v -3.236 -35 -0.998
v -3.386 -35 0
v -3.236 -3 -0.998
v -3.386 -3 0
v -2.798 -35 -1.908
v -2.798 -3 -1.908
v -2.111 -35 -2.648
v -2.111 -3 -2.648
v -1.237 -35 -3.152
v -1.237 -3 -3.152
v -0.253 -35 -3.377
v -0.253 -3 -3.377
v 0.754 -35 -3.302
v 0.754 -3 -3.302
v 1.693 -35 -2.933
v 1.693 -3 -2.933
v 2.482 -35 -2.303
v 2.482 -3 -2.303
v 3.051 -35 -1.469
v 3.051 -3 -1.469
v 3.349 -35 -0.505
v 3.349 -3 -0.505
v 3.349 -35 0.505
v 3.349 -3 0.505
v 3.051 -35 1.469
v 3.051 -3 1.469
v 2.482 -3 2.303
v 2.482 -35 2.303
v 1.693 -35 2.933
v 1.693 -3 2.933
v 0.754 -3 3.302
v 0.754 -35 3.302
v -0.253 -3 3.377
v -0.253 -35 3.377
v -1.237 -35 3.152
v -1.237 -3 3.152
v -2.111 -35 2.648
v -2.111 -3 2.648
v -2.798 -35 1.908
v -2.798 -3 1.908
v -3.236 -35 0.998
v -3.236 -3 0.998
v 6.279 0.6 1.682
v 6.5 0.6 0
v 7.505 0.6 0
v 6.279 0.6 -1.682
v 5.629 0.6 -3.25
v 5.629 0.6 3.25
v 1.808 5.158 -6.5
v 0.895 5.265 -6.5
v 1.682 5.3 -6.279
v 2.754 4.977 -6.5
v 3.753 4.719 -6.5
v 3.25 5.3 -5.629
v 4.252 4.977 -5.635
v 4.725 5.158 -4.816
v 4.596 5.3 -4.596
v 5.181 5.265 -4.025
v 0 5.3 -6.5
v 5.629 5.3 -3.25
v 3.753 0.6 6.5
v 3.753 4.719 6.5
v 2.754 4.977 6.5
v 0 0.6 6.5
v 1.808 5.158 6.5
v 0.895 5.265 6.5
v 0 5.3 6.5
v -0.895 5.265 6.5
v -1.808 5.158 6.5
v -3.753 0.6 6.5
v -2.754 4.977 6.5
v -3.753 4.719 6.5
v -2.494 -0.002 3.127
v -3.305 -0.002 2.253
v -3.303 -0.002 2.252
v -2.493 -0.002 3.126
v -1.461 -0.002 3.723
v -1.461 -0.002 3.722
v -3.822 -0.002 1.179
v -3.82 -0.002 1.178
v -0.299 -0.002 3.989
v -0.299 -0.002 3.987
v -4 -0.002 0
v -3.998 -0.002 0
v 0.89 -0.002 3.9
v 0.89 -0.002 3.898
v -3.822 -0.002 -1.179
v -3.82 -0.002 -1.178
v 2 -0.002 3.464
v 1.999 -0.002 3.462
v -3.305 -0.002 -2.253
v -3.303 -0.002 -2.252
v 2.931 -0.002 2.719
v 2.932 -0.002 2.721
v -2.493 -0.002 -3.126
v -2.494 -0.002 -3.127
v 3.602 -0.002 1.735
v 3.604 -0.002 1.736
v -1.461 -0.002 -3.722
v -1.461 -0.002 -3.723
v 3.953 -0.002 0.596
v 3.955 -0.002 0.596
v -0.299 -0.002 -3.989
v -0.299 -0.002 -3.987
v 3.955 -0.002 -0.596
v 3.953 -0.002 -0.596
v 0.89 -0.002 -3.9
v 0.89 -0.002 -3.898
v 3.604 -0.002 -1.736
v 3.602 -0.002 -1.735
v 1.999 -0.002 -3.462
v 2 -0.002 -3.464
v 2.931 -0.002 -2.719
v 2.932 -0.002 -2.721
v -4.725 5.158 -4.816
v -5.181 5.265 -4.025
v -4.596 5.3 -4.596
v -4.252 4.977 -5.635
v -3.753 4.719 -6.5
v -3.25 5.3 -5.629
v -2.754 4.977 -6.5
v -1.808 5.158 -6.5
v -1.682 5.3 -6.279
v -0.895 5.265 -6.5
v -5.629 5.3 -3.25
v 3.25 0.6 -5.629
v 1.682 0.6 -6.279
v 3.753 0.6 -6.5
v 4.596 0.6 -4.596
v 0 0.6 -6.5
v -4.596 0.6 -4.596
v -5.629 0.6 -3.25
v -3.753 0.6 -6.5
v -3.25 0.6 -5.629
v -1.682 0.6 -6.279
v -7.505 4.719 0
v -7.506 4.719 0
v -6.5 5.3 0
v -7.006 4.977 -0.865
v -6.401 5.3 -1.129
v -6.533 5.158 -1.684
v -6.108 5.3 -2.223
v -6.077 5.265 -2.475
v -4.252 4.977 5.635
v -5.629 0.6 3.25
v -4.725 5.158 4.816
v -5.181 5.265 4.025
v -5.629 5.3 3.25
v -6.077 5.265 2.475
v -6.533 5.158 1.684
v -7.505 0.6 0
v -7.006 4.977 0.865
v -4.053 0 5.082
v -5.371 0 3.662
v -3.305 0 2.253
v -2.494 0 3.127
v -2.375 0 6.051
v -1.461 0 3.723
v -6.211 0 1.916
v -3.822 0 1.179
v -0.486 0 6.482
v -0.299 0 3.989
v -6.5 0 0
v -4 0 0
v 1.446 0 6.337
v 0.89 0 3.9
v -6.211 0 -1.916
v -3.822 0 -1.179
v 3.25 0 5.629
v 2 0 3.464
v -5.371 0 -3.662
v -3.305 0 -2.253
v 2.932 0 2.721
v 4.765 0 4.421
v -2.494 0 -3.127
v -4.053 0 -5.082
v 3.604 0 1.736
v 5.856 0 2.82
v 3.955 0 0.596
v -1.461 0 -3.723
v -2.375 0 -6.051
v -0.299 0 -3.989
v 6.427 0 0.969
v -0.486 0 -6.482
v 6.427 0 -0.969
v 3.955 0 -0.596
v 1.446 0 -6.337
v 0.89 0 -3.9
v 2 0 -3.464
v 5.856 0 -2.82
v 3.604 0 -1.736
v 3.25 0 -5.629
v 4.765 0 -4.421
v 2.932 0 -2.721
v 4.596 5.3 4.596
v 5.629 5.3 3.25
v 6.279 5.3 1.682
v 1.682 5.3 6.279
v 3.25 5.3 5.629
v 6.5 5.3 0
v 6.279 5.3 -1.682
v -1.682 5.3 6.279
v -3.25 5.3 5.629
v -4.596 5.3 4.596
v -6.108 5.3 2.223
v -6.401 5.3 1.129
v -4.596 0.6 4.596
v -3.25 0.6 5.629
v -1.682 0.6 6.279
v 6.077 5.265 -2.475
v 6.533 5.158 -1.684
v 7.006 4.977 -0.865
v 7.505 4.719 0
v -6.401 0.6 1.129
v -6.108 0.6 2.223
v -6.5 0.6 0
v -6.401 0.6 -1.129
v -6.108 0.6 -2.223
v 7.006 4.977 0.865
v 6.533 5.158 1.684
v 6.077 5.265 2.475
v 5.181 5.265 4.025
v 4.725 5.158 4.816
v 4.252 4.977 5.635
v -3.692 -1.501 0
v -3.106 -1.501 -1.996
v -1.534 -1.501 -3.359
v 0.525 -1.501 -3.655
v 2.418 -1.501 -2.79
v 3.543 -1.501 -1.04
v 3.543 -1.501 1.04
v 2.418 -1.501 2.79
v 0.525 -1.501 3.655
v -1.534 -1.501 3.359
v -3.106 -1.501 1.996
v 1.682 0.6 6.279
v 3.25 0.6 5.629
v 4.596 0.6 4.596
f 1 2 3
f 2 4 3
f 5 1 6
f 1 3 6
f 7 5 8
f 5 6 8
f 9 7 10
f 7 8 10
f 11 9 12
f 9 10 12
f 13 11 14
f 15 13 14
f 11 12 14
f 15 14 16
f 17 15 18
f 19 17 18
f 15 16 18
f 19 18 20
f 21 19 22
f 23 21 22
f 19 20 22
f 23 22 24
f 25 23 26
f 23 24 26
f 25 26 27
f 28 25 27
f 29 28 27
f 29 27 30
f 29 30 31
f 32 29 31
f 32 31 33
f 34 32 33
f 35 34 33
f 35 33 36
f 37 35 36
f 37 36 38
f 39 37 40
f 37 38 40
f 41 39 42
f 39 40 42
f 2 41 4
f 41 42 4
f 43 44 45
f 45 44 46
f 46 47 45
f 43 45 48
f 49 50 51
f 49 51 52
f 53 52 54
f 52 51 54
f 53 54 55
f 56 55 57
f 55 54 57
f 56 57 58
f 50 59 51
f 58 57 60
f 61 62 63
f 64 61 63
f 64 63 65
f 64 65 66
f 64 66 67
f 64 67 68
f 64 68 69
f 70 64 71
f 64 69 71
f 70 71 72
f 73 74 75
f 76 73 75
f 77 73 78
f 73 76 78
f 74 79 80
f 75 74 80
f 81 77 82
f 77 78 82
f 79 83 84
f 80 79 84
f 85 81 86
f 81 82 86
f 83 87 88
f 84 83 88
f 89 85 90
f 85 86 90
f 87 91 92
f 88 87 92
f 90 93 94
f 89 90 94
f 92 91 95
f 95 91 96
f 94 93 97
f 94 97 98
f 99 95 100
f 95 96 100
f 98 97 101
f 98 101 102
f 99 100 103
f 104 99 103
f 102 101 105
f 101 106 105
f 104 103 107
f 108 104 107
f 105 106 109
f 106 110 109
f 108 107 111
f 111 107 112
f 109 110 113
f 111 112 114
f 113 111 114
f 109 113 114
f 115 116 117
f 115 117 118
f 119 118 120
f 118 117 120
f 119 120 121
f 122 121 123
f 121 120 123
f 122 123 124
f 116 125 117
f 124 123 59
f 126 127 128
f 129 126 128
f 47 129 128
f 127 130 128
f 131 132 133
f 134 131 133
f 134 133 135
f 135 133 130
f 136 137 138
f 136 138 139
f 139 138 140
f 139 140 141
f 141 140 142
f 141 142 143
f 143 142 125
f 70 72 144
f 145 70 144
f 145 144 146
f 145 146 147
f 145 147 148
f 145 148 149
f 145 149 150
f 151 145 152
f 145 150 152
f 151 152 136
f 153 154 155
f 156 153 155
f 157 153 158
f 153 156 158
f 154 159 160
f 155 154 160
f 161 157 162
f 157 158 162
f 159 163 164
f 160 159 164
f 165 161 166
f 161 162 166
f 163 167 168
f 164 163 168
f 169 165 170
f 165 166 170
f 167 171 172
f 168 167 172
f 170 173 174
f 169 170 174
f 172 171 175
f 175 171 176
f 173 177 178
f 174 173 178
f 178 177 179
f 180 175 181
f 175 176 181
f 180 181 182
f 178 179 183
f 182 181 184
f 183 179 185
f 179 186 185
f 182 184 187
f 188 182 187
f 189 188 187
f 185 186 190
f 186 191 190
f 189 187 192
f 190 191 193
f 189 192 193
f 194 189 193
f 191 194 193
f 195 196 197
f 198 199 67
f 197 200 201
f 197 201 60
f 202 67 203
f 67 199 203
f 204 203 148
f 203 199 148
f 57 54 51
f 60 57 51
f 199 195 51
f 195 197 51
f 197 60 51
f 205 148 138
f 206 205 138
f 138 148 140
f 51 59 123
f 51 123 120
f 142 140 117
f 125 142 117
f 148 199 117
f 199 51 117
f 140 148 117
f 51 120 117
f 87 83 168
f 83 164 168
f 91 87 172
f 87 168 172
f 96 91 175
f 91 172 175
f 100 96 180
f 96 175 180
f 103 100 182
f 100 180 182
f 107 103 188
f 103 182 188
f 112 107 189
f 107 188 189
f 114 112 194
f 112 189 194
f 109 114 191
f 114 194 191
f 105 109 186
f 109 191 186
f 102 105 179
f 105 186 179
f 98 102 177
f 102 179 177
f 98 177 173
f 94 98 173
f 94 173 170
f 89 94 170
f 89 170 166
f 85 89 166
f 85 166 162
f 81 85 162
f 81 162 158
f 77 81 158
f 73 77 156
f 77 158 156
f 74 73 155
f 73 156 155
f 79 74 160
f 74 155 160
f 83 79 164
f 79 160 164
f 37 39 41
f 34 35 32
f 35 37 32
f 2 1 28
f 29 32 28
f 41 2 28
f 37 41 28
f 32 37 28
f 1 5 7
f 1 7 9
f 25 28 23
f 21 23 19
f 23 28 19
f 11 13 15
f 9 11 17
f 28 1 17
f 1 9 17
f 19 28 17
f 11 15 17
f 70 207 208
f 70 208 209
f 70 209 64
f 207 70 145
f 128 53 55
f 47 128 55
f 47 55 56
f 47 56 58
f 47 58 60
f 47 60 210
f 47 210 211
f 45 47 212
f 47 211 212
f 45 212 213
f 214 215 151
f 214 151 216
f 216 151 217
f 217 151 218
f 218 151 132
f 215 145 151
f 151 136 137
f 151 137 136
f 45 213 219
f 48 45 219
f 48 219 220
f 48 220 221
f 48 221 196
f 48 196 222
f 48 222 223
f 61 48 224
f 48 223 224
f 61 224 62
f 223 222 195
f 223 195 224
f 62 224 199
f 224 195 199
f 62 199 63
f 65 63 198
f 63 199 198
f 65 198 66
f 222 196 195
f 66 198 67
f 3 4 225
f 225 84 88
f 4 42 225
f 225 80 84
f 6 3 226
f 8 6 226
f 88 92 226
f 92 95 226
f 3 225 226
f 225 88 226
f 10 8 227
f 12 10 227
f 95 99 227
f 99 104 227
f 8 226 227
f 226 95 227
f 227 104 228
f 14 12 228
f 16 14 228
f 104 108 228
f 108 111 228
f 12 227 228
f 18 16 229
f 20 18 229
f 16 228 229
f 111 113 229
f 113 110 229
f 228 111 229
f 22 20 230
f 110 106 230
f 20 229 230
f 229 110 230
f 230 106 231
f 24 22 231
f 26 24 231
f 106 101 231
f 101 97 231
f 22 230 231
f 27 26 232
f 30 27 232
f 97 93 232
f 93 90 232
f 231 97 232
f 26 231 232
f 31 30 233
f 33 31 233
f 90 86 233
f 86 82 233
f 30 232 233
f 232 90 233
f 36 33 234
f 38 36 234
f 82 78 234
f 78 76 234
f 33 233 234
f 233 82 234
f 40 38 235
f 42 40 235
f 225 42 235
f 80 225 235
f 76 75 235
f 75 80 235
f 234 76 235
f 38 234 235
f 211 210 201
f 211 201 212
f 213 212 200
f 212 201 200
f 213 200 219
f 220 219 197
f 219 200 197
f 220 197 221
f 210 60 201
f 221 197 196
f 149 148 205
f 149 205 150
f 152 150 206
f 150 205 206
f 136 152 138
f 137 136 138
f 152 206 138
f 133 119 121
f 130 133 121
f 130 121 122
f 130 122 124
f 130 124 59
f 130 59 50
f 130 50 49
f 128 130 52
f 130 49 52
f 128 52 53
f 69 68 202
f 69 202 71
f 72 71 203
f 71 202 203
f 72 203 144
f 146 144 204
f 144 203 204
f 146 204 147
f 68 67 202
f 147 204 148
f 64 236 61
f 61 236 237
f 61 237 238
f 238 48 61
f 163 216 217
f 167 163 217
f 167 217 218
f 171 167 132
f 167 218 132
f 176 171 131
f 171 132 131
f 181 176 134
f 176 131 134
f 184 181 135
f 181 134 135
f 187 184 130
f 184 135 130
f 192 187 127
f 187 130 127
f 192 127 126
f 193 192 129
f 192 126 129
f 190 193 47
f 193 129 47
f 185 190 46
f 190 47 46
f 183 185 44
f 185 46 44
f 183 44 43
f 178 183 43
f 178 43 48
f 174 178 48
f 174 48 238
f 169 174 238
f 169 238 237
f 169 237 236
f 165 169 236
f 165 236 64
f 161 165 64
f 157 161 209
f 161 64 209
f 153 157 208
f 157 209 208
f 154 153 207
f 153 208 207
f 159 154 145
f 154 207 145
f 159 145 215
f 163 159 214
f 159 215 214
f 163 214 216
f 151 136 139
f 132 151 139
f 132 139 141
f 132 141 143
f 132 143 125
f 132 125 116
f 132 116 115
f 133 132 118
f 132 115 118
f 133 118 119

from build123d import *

# Parameters (mm, degrees)
SKIZZE2_OUTSIDE_W               = 26.122
SKIZZE2_OUTSIDE_H               = 26.122
SCHNITT_LINEAR_AUSTRAGEN1_DEPTH = 42.674393343


with BuildPart() as part:
    # Skizze1 → Basis-Rotation (revolve)
    with BuildSketch(Plane.XY, mode=Mode.PRIVATE) as basis_rotation_sk:
        Polygon((0, 5.3), (0, -35), (3.3865, -35), (3.3865, -3), (3.998, -0.002), (4, -0.002), (4, 0), (6.5, 0), (6.5, 0.6), (7.5055, 0.6), (7.5055, 4.719474304), (6.5, 5.3), align=None)
    revolve(basis_rotation_sk.sketch.rotate(Axis((0, 5.3, 0), (0, -1, 0)), 180), axis=Axis((0, 5.3, 0), (0, -1, 0)))

    # Skizze2 outside → Schnitt-Linear austragen1 (cut, through all)
    with BuildSketch(Plane(origin=(0, 5.3, 0), x_dir=(-1, 0, 0), z_dir=(0, 1, 0))):
        Rectangle(SKIZZE2_OUTSIDE_W, SKIZZE2_OUTSIDE_H)
        Polygon((-3.75277675, 6.5), (3.75277675, 6.5), (7.505553499, 0), (3.75277675, -6.5), (-3.75277675, -6.5), (-7.505553499, 0), align=None, mode=Mode.SUBTRACT)
    extrude(amount=-SCHNITT_LINEAR_AUSTRAGEN1_DEPTH, mode=Mode.SUBTRACT)


solid = part.part
